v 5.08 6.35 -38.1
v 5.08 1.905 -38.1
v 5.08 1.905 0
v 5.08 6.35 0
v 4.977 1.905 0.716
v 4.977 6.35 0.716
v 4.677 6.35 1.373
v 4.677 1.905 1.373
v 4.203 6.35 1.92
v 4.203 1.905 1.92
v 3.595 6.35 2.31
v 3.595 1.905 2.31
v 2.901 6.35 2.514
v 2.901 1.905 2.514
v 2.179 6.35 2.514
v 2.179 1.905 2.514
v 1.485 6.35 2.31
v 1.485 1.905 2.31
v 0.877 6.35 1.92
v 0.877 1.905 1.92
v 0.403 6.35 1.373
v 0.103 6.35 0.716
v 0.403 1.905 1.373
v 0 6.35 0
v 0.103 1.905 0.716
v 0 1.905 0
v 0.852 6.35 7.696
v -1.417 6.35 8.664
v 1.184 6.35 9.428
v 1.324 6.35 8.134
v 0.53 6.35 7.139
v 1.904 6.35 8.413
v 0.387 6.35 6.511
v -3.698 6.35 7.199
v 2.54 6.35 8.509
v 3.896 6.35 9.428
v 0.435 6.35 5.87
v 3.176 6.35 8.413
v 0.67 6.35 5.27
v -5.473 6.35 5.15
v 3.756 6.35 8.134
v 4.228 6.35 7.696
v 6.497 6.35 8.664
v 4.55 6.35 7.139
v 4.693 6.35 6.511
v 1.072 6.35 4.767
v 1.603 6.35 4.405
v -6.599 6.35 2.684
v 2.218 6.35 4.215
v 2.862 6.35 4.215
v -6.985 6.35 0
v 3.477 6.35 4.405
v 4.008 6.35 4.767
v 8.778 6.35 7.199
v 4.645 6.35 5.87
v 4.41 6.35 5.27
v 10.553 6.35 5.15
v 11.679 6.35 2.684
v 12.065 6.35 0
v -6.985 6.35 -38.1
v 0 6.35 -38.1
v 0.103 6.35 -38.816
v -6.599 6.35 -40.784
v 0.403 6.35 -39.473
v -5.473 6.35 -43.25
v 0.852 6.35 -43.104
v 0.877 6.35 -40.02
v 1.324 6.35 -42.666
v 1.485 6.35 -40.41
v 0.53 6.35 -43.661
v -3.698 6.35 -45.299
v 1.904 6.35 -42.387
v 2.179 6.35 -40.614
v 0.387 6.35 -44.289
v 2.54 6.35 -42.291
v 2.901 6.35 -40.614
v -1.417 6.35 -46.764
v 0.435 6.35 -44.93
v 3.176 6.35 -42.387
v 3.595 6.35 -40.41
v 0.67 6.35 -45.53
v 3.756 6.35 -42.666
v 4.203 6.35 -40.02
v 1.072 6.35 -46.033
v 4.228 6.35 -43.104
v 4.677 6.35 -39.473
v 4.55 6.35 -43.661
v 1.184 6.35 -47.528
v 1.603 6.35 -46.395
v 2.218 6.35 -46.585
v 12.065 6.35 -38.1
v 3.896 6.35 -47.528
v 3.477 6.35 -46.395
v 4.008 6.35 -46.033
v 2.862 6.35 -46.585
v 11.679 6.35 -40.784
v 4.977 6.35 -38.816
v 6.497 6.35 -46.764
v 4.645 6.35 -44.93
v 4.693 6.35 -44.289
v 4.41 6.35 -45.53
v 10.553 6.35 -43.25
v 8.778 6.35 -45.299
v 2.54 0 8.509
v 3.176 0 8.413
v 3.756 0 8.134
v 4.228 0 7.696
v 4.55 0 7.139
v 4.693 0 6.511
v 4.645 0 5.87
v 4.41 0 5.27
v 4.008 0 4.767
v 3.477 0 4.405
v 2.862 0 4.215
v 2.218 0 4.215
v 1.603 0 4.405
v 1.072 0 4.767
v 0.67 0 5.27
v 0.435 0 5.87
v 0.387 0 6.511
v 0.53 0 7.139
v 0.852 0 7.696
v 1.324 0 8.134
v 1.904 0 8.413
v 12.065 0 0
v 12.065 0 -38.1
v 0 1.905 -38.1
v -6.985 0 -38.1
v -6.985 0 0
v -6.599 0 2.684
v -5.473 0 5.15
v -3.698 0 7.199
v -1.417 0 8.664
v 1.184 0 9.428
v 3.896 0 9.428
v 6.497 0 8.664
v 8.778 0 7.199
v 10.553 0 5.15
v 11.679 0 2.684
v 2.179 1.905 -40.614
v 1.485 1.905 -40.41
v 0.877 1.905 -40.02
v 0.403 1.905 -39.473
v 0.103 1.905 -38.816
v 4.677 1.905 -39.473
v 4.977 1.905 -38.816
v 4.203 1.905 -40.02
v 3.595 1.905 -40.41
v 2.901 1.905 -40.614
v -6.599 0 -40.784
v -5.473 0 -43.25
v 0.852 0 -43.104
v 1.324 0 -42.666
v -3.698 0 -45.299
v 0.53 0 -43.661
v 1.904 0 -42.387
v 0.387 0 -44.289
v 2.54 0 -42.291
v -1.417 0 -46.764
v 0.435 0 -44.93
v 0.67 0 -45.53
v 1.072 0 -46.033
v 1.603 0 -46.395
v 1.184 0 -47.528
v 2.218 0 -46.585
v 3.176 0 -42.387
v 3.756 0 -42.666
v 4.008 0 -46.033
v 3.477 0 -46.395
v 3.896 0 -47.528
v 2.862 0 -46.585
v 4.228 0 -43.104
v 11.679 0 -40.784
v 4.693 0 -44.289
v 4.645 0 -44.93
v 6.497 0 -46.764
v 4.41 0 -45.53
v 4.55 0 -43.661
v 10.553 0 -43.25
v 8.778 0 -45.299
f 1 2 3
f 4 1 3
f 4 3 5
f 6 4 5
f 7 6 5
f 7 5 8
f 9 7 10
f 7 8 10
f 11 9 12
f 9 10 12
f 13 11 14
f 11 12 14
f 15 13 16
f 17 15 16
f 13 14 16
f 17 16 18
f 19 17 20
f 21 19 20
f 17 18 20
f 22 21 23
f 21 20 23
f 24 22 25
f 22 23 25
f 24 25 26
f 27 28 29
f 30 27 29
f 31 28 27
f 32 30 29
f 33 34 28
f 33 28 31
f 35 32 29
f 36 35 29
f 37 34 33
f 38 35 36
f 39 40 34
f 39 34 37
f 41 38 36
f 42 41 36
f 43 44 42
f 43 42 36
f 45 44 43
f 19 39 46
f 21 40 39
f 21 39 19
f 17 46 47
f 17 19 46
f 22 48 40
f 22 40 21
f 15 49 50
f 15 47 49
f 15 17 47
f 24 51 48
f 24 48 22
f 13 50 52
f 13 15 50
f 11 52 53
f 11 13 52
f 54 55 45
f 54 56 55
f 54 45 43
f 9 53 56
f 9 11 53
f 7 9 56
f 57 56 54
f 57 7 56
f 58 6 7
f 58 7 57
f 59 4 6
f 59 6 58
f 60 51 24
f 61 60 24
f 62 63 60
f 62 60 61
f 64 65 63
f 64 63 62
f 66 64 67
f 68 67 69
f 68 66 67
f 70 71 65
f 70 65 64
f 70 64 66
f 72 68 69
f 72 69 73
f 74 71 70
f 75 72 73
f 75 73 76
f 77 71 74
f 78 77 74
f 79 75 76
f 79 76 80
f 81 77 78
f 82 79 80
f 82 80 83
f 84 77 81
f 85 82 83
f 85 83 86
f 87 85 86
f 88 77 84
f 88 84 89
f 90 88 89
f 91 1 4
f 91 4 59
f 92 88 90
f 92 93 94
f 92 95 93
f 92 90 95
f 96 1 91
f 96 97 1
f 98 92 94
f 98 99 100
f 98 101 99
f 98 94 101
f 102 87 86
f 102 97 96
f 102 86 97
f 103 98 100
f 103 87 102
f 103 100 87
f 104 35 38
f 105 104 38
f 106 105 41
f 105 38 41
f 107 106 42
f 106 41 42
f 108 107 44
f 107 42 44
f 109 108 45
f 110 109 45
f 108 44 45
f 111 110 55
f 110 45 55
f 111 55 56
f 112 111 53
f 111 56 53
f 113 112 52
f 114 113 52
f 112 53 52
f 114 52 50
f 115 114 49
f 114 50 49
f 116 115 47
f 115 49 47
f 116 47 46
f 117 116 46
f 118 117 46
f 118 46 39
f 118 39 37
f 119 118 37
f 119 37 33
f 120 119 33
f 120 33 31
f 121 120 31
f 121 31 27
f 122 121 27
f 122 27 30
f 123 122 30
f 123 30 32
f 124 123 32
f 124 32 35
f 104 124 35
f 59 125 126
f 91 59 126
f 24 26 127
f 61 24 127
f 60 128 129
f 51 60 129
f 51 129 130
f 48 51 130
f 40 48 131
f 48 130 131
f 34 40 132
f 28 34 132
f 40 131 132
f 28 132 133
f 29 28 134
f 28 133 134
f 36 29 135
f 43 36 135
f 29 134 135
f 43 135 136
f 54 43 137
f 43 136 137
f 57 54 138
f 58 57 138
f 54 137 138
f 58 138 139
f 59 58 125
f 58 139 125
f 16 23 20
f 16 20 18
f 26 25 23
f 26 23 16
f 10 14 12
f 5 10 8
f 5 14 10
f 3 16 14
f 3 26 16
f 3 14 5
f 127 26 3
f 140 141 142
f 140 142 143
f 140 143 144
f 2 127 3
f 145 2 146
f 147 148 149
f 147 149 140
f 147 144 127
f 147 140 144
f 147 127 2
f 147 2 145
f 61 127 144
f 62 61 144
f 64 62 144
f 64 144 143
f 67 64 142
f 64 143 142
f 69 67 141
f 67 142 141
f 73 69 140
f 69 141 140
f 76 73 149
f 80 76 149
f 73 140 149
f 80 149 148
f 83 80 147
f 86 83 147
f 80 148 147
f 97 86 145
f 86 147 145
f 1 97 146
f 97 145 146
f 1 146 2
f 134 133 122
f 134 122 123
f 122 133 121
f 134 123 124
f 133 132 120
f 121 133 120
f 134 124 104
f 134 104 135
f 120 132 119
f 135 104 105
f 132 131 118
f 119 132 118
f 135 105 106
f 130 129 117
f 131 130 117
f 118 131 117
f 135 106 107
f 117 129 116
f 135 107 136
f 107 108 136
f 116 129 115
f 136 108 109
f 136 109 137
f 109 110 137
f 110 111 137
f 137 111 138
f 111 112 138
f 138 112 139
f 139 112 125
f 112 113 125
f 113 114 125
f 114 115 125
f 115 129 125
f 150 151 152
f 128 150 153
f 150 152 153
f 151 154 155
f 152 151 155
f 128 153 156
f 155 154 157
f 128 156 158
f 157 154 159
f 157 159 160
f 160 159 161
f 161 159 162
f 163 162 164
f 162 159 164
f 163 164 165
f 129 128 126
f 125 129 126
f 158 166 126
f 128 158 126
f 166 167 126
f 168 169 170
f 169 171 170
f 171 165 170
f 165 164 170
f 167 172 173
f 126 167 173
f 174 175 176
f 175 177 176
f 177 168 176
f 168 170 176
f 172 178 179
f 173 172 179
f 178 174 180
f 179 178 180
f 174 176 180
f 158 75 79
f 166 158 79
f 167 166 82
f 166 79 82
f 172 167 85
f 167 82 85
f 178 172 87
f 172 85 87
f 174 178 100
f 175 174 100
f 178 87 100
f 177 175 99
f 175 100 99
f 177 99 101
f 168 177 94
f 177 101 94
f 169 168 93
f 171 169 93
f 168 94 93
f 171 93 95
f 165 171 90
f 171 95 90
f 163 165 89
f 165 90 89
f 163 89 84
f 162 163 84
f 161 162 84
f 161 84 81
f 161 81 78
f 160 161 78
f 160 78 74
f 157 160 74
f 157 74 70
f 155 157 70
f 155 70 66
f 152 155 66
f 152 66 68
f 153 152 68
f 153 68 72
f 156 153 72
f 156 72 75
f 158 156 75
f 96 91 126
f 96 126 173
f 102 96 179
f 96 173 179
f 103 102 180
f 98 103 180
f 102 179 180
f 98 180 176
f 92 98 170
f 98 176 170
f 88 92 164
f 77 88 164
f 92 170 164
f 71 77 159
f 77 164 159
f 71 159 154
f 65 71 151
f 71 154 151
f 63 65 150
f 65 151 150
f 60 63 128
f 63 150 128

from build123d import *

# Parameters (mm, degrees)
BOSS_EXTRUDE1_DEPTH = 6.35
BOSS_EXTRUDE2_DEPTH = 1.905
SKETCH3_R           = 2.159
CUT_EXTRUDE1_DEPTH  = 12.7


with BuildPart() as part:
    # Sketch1 → Boss-Extrude1 (new body)
    with BuildSketch(Plane(origin=(0, 0, 0), x_dir=(1, 0, 0), z_dir=(0, 1, 0))):
        with BuildLine():
            Line((-6.985, 38.1), (-6.985, 0))
            ThreePointArc((-6.985, 0), (2.54, -9.525), (12.065, 0))
            Line((12.065, 0), (12.065, 38.1))
            ThreePointArc((12.065, 38.1), (2.54, 47.625), (-6.985, 38.1))
        make_face()
        with BuildLine():
            Line((0, 0), (0, 38.1))
            ThreePointArc((0, 38.1), (2.54, 40.64), (5.08, 38.1))
            Line((5.08, 38.1), (5.08, 0))
            ThreePointArc((5.08, 0), (2.54, -2.54), (0, 0))
        make_face(mode=Mode.SUBTRACT)
    extrude(amount=BOSS_EXTRUDE1_DEPTH)

    # Sketch2 → Boss-Extrude2 (add)
    with BuildSketch(Plane(origin=(0, 0, 0), x_dir=(1, 0, 0), z_dir=(0, 1, 0))):
        with BuildLine():
            Line((0, 38.1), (0, 0))
            ThreePointArc((0, 0), (2.54, -2.54), (5.08, 0))
            Line((5.08, 0), (5.08, 38.1))
            ThreePointArc((5.08, 38.1), (2.54, 40.64), (0, 38.1))
        make_face()
    extrude(amount=BOSS_EXTRUDE2_DEPTH)

    # Sketch3 → Cut-Extrude1 (cut)
    with BuildSketch(Plane(origin=(0, 6.35, 0), x_dir=(1, 0, 0), z_dir=(0, 1, 0))):
        with Locations(Location((2.54, 44.45, 0), (0, 0, 270))):
            Circle(SKETCH3_R)
        with Locations(Location((2.54, -6.35, 0), (0, 0, 270))):
            Circle(SKETCH3_R)
    extrude(amount=-CUT_EXTRUDE1_DEPTH, mode=Mode.SUBTRACT)


solid = part.part
